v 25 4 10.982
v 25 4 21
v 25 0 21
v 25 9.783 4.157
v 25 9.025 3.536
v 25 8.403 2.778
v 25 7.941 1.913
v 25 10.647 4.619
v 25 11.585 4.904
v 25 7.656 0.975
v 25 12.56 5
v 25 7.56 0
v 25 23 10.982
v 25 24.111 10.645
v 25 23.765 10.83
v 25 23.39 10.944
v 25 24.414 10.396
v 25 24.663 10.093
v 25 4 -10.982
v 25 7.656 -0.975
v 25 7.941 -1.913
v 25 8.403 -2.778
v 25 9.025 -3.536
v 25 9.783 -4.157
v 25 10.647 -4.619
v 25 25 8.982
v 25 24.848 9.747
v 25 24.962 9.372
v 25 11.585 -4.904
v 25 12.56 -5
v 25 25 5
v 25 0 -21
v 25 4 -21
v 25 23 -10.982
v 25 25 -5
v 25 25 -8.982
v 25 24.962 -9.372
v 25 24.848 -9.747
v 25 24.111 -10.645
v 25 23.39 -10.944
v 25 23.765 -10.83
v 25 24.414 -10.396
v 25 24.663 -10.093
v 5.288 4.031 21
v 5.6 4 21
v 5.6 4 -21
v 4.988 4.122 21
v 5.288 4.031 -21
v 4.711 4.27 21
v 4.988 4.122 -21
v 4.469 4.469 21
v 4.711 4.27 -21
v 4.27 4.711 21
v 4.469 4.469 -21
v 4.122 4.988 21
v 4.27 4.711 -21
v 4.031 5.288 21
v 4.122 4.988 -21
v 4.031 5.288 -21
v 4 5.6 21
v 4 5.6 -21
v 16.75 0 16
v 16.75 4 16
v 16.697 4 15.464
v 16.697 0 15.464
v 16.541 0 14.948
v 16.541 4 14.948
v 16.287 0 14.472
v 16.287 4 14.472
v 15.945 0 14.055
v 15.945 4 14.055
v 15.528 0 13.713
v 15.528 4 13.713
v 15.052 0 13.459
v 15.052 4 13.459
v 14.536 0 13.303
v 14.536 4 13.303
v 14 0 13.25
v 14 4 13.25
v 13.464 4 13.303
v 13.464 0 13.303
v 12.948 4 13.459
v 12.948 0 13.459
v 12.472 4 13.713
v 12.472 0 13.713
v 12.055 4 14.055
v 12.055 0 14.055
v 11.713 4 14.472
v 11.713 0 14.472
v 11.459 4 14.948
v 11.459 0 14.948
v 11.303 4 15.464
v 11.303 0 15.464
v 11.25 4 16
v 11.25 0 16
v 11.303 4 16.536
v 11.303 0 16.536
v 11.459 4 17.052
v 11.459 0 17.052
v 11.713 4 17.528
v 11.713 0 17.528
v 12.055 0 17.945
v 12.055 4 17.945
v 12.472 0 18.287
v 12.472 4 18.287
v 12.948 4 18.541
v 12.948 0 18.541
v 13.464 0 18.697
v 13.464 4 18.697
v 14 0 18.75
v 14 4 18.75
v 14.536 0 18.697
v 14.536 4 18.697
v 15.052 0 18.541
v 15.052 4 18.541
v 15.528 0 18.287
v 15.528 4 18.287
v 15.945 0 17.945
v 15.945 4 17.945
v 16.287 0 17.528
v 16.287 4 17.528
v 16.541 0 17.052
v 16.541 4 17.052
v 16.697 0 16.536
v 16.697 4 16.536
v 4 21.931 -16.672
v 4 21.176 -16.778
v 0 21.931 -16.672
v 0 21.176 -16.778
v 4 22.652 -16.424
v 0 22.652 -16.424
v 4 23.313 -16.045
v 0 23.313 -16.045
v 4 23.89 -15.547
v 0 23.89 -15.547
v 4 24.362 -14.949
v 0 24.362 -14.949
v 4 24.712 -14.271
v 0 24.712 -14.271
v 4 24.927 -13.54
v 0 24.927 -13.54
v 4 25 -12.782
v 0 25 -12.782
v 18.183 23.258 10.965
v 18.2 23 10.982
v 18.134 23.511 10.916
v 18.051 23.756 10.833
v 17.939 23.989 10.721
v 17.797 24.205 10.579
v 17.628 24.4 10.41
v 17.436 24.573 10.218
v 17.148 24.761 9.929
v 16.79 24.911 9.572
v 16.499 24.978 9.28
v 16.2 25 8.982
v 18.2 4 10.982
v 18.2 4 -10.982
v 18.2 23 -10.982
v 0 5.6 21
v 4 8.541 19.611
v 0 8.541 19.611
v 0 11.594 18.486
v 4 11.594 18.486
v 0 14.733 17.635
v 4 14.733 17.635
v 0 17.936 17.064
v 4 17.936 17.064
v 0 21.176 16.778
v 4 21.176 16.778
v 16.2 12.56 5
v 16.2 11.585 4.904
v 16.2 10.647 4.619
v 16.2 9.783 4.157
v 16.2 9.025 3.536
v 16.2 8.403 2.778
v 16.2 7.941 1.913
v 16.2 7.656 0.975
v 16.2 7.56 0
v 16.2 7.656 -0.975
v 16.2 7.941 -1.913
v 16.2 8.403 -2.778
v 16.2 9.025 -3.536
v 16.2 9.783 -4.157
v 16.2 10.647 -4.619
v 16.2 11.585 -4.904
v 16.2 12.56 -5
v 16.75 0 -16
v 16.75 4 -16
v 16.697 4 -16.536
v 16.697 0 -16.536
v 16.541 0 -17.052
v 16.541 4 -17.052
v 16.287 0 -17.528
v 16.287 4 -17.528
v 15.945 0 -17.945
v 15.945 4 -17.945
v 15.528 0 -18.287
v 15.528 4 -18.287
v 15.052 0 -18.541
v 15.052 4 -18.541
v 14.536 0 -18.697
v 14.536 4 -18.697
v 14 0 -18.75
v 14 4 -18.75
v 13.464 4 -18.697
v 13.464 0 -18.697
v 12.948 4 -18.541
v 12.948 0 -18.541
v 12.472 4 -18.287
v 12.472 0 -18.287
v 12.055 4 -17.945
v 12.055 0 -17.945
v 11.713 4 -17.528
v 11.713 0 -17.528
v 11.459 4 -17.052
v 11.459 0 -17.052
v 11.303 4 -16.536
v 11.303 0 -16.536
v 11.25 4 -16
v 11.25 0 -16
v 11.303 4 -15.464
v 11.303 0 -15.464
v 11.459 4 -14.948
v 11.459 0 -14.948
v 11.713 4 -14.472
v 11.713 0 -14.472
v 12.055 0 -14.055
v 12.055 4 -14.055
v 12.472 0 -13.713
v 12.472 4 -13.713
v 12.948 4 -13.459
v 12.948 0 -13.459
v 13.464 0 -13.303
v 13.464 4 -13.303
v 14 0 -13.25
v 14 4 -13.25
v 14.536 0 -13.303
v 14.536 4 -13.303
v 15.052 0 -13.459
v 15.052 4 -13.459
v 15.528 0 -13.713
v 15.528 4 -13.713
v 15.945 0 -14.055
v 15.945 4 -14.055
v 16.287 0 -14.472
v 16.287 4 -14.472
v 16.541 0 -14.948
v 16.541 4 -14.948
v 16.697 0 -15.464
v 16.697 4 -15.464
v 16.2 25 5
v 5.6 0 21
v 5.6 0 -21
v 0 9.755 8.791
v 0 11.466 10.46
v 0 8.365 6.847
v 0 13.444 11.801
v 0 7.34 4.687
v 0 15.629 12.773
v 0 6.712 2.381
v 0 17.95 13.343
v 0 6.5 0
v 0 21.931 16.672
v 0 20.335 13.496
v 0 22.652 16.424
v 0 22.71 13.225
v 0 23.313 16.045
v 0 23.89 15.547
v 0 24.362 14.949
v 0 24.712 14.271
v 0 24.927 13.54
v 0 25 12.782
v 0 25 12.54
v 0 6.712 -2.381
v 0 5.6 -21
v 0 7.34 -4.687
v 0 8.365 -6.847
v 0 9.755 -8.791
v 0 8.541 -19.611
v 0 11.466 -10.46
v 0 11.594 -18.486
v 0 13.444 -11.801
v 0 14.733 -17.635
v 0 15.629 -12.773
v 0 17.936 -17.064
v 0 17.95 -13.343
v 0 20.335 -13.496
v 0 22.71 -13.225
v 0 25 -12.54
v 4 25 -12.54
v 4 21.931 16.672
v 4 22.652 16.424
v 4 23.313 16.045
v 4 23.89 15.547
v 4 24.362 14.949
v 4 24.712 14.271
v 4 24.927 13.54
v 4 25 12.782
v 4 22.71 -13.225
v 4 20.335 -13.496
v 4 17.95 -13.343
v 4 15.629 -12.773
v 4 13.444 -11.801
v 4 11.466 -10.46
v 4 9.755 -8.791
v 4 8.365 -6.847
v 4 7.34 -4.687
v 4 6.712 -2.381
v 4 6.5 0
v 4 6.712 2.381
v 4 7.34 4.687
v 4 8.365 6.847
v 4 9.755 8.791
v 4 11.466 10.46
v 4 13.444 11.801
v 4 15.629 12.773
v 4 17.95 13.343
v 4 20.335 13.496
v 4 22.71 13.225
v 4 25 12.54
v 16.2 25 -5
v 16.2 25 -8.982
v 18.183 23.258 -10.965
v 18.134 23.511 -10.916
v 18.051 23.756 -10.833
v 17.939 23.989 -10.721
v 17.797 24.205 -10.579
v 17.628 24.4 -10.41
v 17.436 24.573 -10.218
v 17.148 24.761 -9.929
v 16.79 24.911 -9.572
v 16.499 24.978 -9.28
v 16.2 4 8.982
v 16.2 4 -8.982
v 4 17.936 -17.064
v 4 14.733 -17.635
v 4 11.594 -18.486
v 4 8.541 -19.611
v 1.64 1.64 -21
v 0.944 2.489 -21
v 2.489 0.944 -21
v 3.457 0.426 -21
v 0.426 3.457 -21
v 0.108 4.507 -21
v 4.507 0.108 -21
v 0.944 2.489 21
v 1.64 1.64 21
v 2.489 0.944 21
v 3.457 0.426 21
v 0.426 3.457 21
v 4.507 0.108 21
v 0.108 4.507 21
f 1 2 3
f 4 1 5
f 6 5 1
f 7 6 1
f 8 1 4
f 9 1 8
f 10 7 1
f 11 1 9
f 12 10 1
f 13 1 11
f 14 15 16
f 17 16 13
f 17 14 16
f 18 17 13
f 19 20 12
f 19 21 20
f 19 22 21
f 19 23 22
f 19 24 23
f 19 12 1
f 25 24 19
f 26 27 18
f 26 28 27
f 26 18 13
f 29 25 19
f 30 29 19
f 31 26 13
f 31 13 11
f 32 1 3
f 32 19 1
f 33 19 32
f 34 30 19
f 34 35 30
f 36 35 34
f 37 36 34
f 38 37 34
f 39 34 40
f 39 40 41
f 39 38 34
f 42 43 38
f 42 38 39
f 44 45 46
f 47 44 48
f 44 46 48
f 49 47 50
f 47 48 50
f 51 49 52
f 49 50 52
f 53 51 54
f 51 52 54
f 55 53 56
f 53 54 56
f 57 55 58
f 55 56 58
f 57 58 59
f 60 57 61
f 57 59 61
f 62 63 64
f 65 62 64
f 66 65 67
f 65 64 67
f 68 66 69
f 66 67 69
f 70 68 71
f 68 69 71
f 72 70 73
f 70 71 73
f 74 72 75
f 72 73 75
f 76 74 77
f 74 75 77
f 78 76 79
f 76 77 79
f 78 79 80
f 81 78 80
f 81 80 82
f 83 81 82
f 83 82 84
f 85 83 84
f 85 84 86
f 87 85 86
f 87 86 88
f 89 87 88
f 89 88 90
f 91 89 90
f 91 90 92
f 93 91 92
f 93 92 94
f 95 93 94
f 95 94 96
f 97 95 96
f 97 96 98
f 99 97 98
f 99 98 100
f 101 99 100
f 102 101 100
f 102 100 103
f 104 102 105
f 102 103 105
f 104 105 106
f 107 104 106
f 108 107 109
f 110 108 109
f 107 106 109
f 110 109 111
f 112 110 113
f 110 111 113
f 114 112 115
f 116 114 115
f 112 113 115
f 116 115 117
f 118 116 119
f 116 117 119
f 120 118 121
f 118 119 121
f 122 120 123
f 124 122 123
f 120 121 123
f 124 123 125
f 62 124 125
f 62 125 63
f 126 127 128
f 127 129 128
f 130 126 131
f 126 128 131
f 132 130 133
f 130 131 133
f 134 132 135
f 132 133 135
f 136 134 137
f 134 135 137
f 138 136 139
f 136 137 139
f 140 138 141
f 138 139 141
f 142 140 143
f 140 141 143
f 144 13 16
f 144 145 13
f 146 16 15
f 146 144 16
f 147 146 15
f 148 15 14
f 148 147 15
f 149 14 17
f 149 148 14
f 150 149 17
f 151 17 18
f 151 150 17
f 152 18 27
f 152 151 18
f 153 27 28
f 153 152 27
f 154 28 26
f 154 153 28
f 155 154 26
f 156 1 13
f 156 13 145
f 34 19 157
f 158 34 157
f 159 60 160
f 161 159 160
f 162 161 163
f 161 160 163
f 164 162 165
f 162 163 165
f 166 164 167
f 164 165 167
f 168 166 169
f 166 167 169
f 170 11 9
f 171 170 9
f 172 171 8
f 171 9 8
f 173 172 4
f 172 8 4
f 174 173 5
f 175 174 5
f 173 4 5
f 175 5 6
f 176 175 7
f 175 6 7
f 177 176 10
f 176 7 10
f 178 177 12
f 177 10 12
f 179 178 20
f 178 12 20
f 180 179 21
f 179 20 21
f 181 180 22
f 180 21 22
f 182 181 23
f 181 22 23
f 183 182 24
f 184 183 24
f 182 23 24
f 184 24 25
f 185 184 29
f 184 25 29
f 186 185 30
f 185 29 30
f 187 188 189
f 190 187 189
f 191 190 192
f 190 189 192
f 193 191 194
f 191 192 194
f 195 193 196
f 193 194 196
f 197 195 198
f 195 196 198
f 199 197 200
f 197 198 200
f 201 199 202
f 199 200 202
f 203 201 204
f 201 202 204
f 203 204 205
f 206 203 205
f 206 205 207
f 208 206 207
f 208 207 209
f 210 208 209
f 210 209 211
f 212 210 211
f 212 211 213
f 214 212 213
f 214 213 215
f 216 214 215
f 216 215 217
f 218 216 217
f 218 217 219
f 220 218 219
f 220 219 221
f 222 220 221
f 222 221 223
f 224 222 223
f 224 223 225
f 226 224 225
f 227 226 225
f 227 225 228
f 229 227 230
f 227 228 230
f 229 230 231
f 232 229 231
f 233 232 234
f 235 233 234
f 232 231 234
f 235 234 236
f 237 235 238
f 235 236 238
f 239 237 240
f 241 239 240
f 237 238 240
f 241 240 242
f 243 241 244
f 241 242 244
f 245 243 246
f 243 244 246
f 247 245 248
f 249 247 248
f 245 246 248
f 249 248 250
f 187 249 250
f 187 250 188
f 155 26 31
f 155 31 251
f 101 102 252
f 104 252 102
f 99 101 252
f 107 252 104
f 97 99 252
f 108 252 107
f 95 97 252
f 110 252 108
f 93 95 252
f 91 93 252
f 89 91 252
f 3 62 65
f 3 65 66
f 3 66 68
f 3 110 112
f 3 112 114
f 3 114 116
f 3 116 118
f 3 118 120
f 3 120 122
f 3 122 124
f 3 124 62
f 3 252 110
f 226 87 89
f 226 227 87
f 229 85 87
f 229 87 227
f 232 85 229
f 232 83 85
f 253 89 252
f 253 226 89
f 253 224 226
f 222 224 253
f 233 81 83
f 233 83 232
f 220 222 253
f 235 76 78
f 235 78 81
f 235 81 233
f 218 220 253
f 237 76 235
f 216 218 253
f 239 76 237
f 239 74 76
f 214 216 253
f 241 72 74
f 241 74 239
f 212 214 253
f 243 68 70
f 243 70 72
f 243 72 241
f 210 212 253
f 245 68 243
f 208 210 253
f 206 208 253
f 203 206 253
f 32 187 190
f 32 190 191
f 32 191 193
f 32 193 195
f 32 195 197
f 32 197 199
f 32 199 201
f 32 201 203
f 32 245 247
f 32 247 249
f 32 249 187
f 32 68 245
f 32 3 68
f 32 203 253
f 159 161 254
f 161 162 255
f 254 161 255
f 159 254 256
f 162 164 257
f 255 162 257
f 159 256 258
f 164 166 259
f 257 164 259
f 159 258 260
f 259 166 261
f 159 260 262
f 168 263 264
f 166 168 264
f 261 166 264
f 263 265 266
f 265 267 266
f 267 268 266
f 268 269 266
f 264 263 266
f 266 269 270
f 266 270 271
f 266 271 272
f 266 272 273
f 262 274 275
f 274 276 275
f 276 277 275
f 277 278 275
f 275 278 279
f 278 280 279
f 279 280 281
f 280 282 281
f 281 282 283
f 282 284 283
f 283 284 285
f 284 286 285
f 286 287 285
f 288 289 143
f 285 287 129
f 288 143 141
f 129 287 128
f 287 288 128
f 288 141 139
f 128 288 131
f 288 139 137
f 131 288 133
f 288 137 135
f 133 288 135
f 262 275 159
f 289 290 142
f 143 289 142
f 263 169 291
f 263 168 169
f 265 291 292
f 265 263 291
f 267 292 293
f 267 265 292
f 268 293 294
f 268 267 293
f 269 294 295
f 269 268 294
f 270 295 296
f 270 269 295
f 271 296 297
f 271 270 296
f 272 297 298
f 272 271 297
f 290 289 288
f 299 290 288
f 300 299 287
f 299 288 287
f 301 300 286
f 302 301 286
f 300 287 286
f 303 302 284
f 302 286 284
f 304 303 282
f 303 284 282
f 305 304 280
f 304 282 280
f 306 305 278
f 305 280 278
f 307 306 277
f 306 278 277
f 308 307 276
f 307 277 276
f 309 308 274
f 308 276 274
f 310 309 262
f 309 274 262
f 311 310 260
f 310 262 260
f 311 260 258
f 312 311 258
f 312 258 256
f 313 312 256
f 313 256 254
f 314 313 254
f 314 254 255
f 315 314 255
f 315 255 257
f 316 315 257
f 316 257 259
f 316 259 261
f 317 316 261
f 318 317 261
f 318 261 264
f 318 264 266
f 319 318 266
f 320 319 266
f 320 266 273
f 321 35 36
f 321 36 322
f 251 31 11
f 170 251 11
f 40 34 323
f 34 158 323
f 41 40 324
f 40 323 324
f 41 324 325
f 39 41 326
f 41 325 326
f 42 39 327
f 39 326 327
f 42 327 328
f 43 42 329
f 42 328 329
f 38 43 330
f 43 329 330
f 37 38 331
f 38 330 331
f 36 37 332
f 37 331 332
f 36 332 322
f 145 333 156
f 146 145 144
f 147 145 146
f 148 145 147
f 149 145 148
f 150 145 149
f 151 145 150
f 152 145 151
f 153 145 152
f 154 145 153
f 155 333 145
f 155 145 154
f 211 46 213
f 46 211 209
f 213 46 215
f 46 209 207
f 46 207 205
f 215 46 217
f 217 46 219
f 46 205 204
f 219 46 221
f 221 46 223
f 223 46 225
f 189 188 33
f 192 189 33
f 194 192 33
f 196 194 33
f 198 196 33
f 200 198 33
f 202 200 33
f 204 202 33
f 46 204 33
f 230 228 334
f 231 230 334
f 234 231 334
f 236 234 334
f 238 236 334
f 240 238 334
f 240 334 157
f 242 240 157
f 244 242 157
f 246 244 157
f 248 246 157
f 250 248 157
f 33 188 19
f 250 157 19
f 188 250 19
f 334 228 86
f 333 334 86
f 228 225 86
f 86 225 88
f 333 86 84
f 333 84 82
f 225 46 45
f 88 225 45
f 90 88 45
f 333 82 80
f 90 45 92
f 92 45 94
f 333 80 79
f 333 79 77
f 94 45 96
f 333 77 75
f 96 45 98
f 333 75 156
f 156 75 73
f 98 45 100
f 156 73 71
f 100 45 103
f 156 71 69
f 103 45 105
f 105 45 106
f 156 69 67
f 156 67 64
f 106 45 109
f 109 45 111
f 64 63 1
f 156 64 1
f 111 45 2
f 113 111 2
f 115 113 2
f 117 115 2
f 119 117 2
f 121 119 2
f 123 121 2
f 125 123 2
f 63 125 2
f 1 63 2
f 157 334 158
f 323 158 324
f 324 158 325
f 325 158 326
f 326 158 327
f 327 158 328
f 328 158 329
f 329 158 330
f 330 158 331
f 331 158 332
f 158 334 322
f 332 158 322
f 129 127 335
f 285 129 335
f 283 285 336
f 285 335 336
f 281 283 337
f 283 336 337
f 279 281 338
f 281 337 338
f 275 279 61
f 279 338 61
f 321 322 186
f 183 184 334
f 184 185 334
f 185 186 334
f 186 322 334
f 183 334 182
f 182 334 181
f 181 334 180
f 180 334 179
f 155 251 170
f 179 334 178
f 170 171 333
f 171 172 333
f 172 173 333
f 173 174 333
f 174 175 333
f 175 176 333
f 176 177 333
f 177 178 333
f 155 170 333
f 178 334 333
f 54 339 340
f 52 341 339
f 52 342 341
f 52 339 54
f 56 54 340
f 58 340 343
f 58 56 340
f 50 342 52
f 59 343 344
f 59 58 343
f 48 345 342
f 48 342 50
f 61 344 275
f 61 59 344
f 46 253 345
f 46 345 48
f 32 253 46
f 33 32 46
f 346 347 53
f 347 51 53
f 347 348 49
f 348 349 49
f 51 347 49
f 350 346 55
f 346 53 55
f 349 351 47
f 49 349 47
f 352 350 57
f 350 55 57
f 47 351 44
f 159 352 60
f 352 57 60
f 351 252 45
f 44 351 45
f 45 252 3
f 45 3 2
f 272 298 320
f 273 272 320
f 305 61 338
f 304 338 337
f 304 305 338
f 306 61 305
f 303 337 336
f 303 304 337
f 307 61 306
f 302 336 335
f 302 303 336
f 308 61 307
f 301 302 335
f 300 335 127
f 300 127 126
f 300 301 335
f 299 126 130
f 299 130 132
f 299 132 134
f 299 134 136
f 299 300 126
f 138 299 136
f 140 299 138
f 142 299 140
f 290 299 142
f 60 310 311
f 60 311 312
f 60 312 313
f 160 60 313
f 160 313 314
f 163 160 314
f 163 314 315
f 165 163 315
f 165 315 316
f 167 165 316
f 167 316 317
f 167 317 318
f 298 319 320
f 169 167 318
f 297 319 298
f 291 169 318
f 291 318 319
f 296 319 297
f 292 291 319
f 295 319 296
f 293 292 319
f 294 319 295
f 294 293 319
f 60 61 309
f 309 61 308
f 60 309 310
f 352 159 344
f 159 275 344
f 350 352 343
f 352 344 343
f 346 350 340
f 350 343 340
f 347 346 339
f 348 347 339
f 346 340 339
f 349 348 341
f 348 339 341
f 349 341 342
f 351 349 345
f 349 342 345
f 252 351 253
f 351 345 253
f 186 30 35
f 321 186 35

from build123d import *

# Parameters (mm, degrees)
SKIZZE1_W                            = 42
SKIZZE1_H                            = 25
AUFSATZ_LINEAR_AUSTRAGEN1_DEPTH      = 25
SKIZZE2_W                            = 21
SKIZZE2_H                            = 21
SCHNITT_LINEAR_AUSTRAGEN1_DEPTH      = 43
SCHNITT_LINEAR_AUSTRAGEN2_DEPTH      = 5
SKIZZE4_W                            = 8.8
SKIZZE4_H                            = 21.963947762
AUFSATZ_LINEAR_AUSTRAGEN2_DEPTH      = 21
SCHNITT_LINEAR_AUSTRAGEN3_REACH      = 27
SCHNITT_LINEAR_AUSTRAGEN4_DEPTH      = 5
DURCHGANGSLOCH_F_R_M241_D            = 27
DURCHGANGSLOCH_F_R_M241_DEPTH        = 4
F_5_5_5_5_DURCHMESSER_BOHRUNG1_D     = 5.5
F_5_5_5_5_DURCHMESSER_BOHRUNG1_DEPTH = 25
FASE1_SIZE                           = 2
VERRUNDUNG1_R                        = 1.6
VERRUNDUNG2_R                        = 2
VERRUNDUNG3_R                        = 4
VERRUNDUNG4_R                        = 5.6


with BuildPart() as part:
    # Skizze1 → Aufsatz-Linear austragen1 (new body)
    with BuildSketch(Plane(origin=(25, 0, 0), x_dir=(0, 0, -1), z_dir=(1, 0, 0))):
        with Locations((0, 12.5)):
            Rectangle(SKIZZE1_W, SKIZZE1_H)
    extrude(amount=-AUFSATZ_LINEAR_AUSTRAGEN1_DEPTH)

    # Skizze2 → Schnitt-Linear austragen1 (cut, through all)
    with BuildSketch(Plane.XY.offset(21)):
        with Locations((14.5, 14.5)):
            Rectangle(SKIZZE2_W, SKIZZE2_H)
    extrude(amount=-SCHNITT_LINEAR_AUSTRAGEN1_DEPTH, mode=Mode.SUBTRACT)

    # Skizze3 → Schnitt-Linear austragen2 (cut, through all)
    with BuildSketch(Plane(origin=(4, 0, 0), x_dir=(0, 0, -1), z_dir=(1, 0, 0))):
        with BuildLine():
            Line((-21, 25), (-21, 5.6))
            ThreePointArc((-21, 5.6), (-17.5737339, 15.012569088), (-16.807587704, 25))
            Line((-16.807587704, 25), (-21, 25))
        make_face()
    extrude(amount=-SCHNITT_LINEAR_AUSTRAGEN2_DEPTH, mode=Mode.SUBTRACT)

    # Skizze4 → Aufsatz-Linear austragen2 (add)
    with BuildSketch(Plane(origin=(0, 4, 0), x_dir=(-1, 0, 0), z_dir=(0, 1, 0))):
        with Locations((-20.6, 0)):
            Rectangle(SKIZZE4_W, SKIZZE4_H)
    extrude(amount=AUFSATZ_LINEAR_AUSTRAGEN2_DEPTH)

    # Skizze5 → Schnitt-Linear austragen3 (cut, up to next)
    with BuildSketch(Plane(origin=(25, 0, 0), x_dir=(0, 0, -1), z_dir=(1, 0, 0)), mode=Mode.PRIVATE) as schnitt_linear_austragen3_sk1:
        with BuildLine():
            Line((5, 25), (-5, 25))
            Line((-5, 25), (-5, 12.560423389))
            ThreePointArc((-5, 12.560423389), (0, 7.560423389), (5, 12.560423389))
            Line((5, 12.560423389), (5, 25))
        make_face()
    schnitt_linear_austragen3_tool1 = extrude(schnitt_linear_austragen3_sk1.sketch, amount=-SCHNITT_LINEAR_AUSTRAGEN3_REACH, mode=Mode.PRIVATE) & part.part
    add(schnitt_linear_austragen3_tool1.solids().sort_by_distance((25, 16.778669, 0))[0], mode=Mode.SUBTRACT)

    # Skizze6 → Schnitt-Linear austragen4 (cut, through all)
    with BuildSketch(Plane(origin=(4, 0, 0), x_dir=(0, 0, -1), z_dir=(1, 0, 0))):
        with BuildLine():
            Line((21, 25), (16.807587704, 25))
            ThreePointArc((16.807587704, 25), (17.5737339, 15.012569088), (21, 5.6))
            Line((21, 5.6), (21, 25))
        make_face()
    extrude(amount=-SCHNITT_LINEAR_AUSTRAGEN4_DEPTH, mode=Mode.SUBTRACT)

    # Durchgangsloch für M241
    with Locations(Plane(origin=(4, 0, 0), x_dir=(0, 0, -1), z_dir=(1, 0, 0))):
        with Locations((0, 20)):
            Hole(DURCHGANGSLOCH_F_R_M241_D / 2, depth=DURCHGANGSLOCH_F_R_M241_DEPTH)

    # Ø5.5 (5.5) Durchmesser Bohrung1
    with Locations(Plane(origin=(0, 0, 0), x_dir=(-1, 0, 0), z_dir=(0, -1, 0))):
        with Locations((-14, -16), (-14, 16)):
            Hole(F_5_5_5_5_DURCHMESSER_BOHRUNG1_D / 2, depth=F_5_5_5_5_DURCHMESSER_BOHRUNG1_DEPTH)

    # Fase1
    fase1_edges = [part.edges().sort_by_distance(p)[0] for p in [
        (16.2, 14.5, -10.981973881),
        (16.2, 14.5, 10.981973881),
    ]]
    chamfer(fase1_edges, length=FASE1_SIZE)

    # Verrundung1
    verrundung1_edges = [part.edges().sort_by_distance(p)[0] for p in [
        (4, 4, 0),
    ]]
    fillet(verrundung1_edges, radius=VERRUNDUNG1_R)

    # Verrundung2
    verrundung2_edges = [part.edges().sort_by_distance(p)[0] for p in [
        (21.6, 25, 10.981973881),
        (21.6, 25, -10.981973881),
    ]]
    fillet(verrundung2_edges, radius=VERRUNDUNG2_R)

    # Verrundung3
    verrundung3_edges = [part.edges().sort_by_distance(p)[0] for p in [
        (2, 25, 16.807587704),
        (2, 25, -16.807587704),
    ]]
    fillet(verrundung3_edges, radius=VERRUNDUNG3_R)

    # Verrundung4
    verrundung4_edges = [part.edges().sort_by_distance(p)[0] for p in [
        (0, 0, 0),
    ]]
    fillet(verrundung4_edges, radius=VERRUNDUNG4_R)


solid = part.part
